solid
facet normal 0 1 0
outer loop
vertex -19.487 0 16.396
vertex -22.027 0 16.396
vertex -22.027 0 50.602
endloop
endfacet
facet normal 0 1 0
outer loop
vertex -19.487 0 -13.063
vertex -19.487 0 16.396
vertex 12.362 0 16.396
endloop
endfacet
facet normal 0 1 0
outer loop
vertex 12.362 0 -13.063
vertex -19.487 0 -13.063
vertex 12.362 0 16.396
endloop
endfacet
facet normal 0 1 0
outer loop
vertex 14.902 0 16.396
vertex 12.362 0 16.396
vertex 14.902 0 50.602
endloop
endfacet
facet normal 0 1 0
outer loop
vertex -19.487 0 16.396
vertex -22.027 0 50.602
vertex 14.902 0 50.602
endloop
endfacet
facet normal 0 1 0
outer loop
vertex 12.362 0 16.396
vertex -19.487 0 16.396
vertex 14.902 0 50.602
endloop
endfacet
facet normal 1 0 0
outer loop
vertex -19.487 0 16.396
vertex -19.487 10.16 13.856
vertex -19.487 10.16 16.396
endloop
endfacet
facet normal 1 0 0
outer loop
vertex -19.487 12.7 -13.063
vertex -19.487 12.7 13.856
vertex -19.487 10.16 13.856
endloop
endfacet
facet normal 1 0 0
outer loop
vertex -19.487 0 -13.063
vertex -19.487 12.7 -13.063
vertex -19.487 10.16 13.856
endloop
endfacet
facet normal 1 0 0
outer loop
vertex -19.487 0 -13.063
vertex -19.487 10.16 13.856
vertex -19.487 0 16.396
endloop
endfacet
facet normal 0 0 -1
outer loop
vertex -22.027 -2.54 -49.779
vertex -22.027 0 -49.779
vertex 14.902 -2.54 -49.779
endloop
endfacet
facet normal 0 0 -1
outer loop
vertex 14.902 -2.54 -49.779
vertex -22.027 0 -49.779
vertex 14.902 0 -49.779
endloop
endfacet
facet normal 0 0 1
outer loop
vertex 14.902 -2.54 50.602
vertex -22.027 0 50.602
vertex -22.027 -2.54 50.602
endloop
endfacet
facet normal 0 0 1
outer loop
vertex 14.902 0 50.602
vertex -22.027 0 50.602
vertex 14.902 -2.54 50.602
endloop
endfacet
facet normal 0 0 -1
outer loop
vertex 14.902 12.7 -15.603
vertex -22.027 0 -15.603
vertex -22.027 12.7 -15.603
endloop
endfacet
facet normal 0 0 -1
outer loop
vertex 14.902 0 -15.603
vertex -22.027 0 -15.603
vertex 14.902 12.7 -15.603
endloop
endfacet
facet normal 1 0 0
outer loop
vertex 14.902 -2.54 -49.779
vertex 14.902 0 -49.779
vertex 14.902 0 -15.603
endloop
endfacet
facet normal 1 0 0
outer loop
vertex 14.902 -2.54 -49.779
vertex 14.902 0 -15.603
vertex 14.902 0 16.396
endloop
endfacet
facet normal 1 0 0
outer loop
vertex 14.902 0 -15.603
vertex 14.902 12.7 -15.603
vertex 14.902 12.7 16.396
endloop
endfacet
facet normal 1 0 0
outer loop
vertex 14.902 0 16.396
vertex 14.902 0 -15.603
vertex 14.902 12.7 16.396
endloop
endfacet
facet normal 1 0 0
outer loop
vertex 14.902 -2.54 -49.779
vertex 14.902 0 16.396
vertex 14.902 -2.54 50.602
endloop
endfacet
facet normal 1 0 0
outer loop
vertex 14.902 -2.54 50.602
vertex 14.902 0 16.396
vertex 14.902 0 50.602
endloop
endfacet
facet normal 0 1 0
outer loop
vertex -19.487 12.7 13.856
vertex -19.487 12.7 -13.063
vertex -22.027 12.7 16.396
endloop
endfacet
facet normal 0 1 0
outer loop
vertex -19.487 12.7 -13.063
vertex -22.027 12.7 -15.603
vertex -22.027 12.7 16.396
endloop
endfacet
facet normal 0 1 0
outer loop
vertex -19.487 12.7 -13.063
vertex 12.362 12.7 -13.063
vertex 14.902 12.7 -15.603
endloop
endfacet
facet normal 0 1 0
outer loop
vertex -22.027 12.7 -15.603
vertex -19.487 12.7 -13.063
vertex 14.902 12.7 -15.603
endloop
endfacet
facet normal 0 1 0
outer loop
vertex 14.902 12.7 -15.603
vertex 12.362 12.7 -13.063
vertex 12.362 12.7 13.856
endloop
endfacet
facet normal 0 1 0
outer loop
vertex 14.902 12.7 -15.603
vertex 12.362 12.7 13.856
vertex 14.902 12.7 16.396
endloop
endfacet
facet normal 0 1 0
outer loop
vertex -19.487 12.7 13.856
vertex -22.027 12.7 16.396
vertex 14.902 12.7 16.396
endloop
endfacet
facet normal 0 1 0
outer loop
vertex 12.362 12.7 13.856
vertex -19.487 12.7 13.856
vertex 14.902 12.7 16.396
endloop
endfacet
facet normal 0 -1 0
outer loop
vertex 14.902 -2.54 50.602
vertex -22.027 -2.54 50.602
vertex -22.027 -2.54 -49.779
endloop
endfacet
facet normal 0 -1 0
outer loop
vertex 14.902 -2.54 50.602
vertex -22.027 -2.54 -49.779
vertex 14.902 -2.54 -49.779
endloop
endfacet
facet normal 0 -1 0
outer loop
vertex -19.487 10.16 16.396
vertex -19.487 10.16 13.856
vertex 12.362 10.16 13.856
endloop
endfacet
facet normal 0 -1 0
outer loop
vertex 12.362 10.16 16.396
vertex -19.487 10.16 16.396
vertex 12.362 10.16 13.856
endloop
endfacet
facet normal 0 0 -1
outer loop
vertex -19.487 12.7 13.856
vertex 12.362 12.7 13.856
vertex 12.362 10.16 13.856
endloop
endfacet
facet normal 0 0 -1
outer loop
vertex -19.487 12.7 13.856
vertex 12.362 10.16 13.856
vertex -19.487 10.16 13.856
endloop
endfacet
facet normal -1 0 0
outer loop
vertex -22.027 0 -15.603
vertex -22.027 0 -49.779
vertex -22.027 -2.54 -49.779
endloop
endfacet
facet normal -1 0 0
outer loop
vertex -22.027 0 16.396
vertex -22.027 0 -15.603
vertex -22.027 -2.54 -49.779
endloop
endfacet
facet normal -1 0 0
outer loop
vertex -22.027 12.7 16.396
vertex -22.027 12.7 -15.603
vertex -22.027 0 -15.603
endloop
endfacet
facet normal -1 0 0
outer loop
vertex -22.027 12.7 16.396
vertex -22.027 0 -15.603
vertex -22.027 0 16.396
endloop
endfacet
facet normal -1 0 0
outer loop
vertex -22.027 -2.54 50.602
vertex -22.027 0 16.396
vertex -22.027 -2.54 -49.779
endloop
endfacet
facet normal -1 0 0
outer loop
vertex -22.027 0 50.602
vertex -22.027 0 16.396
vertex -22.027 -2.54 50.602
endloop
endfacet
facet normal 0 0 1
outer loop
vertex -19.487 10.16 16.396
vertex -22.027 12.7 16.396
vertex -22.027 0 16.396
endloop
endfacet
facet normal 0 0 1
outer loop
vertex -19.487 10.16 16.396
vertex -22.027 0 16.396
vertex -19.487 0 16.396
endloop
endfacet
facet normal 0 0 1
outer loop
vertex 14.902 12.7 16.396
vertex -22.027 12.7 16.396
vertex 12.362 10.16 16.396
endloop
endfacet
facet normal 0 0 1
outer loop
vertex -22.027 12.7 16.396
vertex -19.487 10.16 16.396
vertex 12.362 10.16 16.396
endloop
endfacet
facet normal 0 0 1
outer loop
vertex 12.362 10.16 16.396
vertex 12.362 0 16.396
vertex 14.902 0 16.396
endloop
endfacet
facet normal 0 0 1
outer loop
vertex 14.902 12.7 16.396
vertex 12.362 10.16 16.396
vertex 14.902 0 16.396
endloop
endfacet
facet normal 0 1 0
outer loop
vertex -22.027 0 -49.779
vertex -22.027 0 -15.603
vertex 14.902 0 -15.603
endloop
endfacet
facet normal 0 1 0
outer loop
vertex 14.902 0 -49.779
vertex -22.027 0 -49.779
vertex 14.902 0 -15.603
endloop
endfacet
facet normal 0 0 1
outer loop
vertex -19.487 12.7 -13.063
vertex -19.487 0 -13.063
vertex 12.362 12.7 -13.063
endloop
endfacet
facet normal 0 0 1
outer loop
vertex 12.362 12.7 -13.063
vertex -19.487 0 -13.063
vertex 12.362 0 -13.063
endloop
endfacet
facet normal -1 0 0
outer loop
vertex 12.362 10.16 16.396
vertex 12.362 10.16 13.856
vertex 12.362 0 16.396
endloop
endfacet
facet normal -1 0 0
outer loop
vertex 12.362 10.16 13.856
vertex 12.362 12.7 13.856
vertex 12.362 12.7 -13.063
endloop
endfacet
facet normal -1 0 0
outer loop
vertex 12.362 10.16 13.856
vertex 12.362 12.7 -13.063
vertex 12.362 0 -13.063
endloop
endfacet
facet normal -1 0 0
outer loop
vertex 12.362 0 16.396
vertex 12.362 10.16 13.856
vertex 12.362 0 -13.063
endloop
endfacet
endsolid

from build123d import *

# Parameters (mm, degrees)
F0_W     = 36.92906
F0_H     = 100.3808
F1_DEPTH = 2.54
F2_W     = 36.92906
F2_H     = 31.99892
F3_DEPTH = 15.24
F4_T     = -2.54
F5_W     = 31.84906
F5_H     = 26.91892
F6_DEPTH = 2.54


# Not quite as in the source:
# - a shell that OpenCascade refuses in one call is made with other operations: the cavity is built on its own and cut out


with BuildPart() as f1:
    # F0 (on Front) → F1 (new body)
    with BuildSketch(Plane.XZ):
        with Locations((-3.5625953953, 0.4117265198)):
            Rectangle(F0_W, F0_H)
    extrude(amount=F1_DEPTH)

    # F2 (on face) → F3 (join)
    with BuildSketch(Plane.XZ.offset(2.54)):
        with Locations((-3.5625953953, 0.3964865198)):
            Rectangle(F2_W, F2_H)
    extrude(amount=-F3_DEPTH)

    # F4: a shell. OpenCascade refuses it in one call, so the cavity is built on its own and cut out:
    # the body offset inwards by the wall thickness, plus a prism from it out through each open face.
    f4_core = offset(f1.part, amount=F4_T, kind=Kind.INTERSECTION, mode=Mode.PRIVATE)
    f4_exits = [f4_core.faces().sort_by_distance(p)[0] for p in [
        (-3.562595, 5.08, 13.855947),
    ]]
    add(f4_core, mode=Mode.SUBTRACT)
    extrude(f4_exits, amount=-F4_T, mode=Mode.SUBTRACT)

    # F5 (on face) → F6 (cut, through all)
    with BuildSketch(Plane(origin=(0, 12.7, 0), x_dir=(-1, 0, 0), z_dir=(0, 1, 0))):
        with Locations((3.5625953953, 0.3964865198)):
            Rectangle(F5_W, F5_H)
    extrude(amount=-F6_DEPTH, mode=Mode.SUBTRACT)


solid = f1.part
